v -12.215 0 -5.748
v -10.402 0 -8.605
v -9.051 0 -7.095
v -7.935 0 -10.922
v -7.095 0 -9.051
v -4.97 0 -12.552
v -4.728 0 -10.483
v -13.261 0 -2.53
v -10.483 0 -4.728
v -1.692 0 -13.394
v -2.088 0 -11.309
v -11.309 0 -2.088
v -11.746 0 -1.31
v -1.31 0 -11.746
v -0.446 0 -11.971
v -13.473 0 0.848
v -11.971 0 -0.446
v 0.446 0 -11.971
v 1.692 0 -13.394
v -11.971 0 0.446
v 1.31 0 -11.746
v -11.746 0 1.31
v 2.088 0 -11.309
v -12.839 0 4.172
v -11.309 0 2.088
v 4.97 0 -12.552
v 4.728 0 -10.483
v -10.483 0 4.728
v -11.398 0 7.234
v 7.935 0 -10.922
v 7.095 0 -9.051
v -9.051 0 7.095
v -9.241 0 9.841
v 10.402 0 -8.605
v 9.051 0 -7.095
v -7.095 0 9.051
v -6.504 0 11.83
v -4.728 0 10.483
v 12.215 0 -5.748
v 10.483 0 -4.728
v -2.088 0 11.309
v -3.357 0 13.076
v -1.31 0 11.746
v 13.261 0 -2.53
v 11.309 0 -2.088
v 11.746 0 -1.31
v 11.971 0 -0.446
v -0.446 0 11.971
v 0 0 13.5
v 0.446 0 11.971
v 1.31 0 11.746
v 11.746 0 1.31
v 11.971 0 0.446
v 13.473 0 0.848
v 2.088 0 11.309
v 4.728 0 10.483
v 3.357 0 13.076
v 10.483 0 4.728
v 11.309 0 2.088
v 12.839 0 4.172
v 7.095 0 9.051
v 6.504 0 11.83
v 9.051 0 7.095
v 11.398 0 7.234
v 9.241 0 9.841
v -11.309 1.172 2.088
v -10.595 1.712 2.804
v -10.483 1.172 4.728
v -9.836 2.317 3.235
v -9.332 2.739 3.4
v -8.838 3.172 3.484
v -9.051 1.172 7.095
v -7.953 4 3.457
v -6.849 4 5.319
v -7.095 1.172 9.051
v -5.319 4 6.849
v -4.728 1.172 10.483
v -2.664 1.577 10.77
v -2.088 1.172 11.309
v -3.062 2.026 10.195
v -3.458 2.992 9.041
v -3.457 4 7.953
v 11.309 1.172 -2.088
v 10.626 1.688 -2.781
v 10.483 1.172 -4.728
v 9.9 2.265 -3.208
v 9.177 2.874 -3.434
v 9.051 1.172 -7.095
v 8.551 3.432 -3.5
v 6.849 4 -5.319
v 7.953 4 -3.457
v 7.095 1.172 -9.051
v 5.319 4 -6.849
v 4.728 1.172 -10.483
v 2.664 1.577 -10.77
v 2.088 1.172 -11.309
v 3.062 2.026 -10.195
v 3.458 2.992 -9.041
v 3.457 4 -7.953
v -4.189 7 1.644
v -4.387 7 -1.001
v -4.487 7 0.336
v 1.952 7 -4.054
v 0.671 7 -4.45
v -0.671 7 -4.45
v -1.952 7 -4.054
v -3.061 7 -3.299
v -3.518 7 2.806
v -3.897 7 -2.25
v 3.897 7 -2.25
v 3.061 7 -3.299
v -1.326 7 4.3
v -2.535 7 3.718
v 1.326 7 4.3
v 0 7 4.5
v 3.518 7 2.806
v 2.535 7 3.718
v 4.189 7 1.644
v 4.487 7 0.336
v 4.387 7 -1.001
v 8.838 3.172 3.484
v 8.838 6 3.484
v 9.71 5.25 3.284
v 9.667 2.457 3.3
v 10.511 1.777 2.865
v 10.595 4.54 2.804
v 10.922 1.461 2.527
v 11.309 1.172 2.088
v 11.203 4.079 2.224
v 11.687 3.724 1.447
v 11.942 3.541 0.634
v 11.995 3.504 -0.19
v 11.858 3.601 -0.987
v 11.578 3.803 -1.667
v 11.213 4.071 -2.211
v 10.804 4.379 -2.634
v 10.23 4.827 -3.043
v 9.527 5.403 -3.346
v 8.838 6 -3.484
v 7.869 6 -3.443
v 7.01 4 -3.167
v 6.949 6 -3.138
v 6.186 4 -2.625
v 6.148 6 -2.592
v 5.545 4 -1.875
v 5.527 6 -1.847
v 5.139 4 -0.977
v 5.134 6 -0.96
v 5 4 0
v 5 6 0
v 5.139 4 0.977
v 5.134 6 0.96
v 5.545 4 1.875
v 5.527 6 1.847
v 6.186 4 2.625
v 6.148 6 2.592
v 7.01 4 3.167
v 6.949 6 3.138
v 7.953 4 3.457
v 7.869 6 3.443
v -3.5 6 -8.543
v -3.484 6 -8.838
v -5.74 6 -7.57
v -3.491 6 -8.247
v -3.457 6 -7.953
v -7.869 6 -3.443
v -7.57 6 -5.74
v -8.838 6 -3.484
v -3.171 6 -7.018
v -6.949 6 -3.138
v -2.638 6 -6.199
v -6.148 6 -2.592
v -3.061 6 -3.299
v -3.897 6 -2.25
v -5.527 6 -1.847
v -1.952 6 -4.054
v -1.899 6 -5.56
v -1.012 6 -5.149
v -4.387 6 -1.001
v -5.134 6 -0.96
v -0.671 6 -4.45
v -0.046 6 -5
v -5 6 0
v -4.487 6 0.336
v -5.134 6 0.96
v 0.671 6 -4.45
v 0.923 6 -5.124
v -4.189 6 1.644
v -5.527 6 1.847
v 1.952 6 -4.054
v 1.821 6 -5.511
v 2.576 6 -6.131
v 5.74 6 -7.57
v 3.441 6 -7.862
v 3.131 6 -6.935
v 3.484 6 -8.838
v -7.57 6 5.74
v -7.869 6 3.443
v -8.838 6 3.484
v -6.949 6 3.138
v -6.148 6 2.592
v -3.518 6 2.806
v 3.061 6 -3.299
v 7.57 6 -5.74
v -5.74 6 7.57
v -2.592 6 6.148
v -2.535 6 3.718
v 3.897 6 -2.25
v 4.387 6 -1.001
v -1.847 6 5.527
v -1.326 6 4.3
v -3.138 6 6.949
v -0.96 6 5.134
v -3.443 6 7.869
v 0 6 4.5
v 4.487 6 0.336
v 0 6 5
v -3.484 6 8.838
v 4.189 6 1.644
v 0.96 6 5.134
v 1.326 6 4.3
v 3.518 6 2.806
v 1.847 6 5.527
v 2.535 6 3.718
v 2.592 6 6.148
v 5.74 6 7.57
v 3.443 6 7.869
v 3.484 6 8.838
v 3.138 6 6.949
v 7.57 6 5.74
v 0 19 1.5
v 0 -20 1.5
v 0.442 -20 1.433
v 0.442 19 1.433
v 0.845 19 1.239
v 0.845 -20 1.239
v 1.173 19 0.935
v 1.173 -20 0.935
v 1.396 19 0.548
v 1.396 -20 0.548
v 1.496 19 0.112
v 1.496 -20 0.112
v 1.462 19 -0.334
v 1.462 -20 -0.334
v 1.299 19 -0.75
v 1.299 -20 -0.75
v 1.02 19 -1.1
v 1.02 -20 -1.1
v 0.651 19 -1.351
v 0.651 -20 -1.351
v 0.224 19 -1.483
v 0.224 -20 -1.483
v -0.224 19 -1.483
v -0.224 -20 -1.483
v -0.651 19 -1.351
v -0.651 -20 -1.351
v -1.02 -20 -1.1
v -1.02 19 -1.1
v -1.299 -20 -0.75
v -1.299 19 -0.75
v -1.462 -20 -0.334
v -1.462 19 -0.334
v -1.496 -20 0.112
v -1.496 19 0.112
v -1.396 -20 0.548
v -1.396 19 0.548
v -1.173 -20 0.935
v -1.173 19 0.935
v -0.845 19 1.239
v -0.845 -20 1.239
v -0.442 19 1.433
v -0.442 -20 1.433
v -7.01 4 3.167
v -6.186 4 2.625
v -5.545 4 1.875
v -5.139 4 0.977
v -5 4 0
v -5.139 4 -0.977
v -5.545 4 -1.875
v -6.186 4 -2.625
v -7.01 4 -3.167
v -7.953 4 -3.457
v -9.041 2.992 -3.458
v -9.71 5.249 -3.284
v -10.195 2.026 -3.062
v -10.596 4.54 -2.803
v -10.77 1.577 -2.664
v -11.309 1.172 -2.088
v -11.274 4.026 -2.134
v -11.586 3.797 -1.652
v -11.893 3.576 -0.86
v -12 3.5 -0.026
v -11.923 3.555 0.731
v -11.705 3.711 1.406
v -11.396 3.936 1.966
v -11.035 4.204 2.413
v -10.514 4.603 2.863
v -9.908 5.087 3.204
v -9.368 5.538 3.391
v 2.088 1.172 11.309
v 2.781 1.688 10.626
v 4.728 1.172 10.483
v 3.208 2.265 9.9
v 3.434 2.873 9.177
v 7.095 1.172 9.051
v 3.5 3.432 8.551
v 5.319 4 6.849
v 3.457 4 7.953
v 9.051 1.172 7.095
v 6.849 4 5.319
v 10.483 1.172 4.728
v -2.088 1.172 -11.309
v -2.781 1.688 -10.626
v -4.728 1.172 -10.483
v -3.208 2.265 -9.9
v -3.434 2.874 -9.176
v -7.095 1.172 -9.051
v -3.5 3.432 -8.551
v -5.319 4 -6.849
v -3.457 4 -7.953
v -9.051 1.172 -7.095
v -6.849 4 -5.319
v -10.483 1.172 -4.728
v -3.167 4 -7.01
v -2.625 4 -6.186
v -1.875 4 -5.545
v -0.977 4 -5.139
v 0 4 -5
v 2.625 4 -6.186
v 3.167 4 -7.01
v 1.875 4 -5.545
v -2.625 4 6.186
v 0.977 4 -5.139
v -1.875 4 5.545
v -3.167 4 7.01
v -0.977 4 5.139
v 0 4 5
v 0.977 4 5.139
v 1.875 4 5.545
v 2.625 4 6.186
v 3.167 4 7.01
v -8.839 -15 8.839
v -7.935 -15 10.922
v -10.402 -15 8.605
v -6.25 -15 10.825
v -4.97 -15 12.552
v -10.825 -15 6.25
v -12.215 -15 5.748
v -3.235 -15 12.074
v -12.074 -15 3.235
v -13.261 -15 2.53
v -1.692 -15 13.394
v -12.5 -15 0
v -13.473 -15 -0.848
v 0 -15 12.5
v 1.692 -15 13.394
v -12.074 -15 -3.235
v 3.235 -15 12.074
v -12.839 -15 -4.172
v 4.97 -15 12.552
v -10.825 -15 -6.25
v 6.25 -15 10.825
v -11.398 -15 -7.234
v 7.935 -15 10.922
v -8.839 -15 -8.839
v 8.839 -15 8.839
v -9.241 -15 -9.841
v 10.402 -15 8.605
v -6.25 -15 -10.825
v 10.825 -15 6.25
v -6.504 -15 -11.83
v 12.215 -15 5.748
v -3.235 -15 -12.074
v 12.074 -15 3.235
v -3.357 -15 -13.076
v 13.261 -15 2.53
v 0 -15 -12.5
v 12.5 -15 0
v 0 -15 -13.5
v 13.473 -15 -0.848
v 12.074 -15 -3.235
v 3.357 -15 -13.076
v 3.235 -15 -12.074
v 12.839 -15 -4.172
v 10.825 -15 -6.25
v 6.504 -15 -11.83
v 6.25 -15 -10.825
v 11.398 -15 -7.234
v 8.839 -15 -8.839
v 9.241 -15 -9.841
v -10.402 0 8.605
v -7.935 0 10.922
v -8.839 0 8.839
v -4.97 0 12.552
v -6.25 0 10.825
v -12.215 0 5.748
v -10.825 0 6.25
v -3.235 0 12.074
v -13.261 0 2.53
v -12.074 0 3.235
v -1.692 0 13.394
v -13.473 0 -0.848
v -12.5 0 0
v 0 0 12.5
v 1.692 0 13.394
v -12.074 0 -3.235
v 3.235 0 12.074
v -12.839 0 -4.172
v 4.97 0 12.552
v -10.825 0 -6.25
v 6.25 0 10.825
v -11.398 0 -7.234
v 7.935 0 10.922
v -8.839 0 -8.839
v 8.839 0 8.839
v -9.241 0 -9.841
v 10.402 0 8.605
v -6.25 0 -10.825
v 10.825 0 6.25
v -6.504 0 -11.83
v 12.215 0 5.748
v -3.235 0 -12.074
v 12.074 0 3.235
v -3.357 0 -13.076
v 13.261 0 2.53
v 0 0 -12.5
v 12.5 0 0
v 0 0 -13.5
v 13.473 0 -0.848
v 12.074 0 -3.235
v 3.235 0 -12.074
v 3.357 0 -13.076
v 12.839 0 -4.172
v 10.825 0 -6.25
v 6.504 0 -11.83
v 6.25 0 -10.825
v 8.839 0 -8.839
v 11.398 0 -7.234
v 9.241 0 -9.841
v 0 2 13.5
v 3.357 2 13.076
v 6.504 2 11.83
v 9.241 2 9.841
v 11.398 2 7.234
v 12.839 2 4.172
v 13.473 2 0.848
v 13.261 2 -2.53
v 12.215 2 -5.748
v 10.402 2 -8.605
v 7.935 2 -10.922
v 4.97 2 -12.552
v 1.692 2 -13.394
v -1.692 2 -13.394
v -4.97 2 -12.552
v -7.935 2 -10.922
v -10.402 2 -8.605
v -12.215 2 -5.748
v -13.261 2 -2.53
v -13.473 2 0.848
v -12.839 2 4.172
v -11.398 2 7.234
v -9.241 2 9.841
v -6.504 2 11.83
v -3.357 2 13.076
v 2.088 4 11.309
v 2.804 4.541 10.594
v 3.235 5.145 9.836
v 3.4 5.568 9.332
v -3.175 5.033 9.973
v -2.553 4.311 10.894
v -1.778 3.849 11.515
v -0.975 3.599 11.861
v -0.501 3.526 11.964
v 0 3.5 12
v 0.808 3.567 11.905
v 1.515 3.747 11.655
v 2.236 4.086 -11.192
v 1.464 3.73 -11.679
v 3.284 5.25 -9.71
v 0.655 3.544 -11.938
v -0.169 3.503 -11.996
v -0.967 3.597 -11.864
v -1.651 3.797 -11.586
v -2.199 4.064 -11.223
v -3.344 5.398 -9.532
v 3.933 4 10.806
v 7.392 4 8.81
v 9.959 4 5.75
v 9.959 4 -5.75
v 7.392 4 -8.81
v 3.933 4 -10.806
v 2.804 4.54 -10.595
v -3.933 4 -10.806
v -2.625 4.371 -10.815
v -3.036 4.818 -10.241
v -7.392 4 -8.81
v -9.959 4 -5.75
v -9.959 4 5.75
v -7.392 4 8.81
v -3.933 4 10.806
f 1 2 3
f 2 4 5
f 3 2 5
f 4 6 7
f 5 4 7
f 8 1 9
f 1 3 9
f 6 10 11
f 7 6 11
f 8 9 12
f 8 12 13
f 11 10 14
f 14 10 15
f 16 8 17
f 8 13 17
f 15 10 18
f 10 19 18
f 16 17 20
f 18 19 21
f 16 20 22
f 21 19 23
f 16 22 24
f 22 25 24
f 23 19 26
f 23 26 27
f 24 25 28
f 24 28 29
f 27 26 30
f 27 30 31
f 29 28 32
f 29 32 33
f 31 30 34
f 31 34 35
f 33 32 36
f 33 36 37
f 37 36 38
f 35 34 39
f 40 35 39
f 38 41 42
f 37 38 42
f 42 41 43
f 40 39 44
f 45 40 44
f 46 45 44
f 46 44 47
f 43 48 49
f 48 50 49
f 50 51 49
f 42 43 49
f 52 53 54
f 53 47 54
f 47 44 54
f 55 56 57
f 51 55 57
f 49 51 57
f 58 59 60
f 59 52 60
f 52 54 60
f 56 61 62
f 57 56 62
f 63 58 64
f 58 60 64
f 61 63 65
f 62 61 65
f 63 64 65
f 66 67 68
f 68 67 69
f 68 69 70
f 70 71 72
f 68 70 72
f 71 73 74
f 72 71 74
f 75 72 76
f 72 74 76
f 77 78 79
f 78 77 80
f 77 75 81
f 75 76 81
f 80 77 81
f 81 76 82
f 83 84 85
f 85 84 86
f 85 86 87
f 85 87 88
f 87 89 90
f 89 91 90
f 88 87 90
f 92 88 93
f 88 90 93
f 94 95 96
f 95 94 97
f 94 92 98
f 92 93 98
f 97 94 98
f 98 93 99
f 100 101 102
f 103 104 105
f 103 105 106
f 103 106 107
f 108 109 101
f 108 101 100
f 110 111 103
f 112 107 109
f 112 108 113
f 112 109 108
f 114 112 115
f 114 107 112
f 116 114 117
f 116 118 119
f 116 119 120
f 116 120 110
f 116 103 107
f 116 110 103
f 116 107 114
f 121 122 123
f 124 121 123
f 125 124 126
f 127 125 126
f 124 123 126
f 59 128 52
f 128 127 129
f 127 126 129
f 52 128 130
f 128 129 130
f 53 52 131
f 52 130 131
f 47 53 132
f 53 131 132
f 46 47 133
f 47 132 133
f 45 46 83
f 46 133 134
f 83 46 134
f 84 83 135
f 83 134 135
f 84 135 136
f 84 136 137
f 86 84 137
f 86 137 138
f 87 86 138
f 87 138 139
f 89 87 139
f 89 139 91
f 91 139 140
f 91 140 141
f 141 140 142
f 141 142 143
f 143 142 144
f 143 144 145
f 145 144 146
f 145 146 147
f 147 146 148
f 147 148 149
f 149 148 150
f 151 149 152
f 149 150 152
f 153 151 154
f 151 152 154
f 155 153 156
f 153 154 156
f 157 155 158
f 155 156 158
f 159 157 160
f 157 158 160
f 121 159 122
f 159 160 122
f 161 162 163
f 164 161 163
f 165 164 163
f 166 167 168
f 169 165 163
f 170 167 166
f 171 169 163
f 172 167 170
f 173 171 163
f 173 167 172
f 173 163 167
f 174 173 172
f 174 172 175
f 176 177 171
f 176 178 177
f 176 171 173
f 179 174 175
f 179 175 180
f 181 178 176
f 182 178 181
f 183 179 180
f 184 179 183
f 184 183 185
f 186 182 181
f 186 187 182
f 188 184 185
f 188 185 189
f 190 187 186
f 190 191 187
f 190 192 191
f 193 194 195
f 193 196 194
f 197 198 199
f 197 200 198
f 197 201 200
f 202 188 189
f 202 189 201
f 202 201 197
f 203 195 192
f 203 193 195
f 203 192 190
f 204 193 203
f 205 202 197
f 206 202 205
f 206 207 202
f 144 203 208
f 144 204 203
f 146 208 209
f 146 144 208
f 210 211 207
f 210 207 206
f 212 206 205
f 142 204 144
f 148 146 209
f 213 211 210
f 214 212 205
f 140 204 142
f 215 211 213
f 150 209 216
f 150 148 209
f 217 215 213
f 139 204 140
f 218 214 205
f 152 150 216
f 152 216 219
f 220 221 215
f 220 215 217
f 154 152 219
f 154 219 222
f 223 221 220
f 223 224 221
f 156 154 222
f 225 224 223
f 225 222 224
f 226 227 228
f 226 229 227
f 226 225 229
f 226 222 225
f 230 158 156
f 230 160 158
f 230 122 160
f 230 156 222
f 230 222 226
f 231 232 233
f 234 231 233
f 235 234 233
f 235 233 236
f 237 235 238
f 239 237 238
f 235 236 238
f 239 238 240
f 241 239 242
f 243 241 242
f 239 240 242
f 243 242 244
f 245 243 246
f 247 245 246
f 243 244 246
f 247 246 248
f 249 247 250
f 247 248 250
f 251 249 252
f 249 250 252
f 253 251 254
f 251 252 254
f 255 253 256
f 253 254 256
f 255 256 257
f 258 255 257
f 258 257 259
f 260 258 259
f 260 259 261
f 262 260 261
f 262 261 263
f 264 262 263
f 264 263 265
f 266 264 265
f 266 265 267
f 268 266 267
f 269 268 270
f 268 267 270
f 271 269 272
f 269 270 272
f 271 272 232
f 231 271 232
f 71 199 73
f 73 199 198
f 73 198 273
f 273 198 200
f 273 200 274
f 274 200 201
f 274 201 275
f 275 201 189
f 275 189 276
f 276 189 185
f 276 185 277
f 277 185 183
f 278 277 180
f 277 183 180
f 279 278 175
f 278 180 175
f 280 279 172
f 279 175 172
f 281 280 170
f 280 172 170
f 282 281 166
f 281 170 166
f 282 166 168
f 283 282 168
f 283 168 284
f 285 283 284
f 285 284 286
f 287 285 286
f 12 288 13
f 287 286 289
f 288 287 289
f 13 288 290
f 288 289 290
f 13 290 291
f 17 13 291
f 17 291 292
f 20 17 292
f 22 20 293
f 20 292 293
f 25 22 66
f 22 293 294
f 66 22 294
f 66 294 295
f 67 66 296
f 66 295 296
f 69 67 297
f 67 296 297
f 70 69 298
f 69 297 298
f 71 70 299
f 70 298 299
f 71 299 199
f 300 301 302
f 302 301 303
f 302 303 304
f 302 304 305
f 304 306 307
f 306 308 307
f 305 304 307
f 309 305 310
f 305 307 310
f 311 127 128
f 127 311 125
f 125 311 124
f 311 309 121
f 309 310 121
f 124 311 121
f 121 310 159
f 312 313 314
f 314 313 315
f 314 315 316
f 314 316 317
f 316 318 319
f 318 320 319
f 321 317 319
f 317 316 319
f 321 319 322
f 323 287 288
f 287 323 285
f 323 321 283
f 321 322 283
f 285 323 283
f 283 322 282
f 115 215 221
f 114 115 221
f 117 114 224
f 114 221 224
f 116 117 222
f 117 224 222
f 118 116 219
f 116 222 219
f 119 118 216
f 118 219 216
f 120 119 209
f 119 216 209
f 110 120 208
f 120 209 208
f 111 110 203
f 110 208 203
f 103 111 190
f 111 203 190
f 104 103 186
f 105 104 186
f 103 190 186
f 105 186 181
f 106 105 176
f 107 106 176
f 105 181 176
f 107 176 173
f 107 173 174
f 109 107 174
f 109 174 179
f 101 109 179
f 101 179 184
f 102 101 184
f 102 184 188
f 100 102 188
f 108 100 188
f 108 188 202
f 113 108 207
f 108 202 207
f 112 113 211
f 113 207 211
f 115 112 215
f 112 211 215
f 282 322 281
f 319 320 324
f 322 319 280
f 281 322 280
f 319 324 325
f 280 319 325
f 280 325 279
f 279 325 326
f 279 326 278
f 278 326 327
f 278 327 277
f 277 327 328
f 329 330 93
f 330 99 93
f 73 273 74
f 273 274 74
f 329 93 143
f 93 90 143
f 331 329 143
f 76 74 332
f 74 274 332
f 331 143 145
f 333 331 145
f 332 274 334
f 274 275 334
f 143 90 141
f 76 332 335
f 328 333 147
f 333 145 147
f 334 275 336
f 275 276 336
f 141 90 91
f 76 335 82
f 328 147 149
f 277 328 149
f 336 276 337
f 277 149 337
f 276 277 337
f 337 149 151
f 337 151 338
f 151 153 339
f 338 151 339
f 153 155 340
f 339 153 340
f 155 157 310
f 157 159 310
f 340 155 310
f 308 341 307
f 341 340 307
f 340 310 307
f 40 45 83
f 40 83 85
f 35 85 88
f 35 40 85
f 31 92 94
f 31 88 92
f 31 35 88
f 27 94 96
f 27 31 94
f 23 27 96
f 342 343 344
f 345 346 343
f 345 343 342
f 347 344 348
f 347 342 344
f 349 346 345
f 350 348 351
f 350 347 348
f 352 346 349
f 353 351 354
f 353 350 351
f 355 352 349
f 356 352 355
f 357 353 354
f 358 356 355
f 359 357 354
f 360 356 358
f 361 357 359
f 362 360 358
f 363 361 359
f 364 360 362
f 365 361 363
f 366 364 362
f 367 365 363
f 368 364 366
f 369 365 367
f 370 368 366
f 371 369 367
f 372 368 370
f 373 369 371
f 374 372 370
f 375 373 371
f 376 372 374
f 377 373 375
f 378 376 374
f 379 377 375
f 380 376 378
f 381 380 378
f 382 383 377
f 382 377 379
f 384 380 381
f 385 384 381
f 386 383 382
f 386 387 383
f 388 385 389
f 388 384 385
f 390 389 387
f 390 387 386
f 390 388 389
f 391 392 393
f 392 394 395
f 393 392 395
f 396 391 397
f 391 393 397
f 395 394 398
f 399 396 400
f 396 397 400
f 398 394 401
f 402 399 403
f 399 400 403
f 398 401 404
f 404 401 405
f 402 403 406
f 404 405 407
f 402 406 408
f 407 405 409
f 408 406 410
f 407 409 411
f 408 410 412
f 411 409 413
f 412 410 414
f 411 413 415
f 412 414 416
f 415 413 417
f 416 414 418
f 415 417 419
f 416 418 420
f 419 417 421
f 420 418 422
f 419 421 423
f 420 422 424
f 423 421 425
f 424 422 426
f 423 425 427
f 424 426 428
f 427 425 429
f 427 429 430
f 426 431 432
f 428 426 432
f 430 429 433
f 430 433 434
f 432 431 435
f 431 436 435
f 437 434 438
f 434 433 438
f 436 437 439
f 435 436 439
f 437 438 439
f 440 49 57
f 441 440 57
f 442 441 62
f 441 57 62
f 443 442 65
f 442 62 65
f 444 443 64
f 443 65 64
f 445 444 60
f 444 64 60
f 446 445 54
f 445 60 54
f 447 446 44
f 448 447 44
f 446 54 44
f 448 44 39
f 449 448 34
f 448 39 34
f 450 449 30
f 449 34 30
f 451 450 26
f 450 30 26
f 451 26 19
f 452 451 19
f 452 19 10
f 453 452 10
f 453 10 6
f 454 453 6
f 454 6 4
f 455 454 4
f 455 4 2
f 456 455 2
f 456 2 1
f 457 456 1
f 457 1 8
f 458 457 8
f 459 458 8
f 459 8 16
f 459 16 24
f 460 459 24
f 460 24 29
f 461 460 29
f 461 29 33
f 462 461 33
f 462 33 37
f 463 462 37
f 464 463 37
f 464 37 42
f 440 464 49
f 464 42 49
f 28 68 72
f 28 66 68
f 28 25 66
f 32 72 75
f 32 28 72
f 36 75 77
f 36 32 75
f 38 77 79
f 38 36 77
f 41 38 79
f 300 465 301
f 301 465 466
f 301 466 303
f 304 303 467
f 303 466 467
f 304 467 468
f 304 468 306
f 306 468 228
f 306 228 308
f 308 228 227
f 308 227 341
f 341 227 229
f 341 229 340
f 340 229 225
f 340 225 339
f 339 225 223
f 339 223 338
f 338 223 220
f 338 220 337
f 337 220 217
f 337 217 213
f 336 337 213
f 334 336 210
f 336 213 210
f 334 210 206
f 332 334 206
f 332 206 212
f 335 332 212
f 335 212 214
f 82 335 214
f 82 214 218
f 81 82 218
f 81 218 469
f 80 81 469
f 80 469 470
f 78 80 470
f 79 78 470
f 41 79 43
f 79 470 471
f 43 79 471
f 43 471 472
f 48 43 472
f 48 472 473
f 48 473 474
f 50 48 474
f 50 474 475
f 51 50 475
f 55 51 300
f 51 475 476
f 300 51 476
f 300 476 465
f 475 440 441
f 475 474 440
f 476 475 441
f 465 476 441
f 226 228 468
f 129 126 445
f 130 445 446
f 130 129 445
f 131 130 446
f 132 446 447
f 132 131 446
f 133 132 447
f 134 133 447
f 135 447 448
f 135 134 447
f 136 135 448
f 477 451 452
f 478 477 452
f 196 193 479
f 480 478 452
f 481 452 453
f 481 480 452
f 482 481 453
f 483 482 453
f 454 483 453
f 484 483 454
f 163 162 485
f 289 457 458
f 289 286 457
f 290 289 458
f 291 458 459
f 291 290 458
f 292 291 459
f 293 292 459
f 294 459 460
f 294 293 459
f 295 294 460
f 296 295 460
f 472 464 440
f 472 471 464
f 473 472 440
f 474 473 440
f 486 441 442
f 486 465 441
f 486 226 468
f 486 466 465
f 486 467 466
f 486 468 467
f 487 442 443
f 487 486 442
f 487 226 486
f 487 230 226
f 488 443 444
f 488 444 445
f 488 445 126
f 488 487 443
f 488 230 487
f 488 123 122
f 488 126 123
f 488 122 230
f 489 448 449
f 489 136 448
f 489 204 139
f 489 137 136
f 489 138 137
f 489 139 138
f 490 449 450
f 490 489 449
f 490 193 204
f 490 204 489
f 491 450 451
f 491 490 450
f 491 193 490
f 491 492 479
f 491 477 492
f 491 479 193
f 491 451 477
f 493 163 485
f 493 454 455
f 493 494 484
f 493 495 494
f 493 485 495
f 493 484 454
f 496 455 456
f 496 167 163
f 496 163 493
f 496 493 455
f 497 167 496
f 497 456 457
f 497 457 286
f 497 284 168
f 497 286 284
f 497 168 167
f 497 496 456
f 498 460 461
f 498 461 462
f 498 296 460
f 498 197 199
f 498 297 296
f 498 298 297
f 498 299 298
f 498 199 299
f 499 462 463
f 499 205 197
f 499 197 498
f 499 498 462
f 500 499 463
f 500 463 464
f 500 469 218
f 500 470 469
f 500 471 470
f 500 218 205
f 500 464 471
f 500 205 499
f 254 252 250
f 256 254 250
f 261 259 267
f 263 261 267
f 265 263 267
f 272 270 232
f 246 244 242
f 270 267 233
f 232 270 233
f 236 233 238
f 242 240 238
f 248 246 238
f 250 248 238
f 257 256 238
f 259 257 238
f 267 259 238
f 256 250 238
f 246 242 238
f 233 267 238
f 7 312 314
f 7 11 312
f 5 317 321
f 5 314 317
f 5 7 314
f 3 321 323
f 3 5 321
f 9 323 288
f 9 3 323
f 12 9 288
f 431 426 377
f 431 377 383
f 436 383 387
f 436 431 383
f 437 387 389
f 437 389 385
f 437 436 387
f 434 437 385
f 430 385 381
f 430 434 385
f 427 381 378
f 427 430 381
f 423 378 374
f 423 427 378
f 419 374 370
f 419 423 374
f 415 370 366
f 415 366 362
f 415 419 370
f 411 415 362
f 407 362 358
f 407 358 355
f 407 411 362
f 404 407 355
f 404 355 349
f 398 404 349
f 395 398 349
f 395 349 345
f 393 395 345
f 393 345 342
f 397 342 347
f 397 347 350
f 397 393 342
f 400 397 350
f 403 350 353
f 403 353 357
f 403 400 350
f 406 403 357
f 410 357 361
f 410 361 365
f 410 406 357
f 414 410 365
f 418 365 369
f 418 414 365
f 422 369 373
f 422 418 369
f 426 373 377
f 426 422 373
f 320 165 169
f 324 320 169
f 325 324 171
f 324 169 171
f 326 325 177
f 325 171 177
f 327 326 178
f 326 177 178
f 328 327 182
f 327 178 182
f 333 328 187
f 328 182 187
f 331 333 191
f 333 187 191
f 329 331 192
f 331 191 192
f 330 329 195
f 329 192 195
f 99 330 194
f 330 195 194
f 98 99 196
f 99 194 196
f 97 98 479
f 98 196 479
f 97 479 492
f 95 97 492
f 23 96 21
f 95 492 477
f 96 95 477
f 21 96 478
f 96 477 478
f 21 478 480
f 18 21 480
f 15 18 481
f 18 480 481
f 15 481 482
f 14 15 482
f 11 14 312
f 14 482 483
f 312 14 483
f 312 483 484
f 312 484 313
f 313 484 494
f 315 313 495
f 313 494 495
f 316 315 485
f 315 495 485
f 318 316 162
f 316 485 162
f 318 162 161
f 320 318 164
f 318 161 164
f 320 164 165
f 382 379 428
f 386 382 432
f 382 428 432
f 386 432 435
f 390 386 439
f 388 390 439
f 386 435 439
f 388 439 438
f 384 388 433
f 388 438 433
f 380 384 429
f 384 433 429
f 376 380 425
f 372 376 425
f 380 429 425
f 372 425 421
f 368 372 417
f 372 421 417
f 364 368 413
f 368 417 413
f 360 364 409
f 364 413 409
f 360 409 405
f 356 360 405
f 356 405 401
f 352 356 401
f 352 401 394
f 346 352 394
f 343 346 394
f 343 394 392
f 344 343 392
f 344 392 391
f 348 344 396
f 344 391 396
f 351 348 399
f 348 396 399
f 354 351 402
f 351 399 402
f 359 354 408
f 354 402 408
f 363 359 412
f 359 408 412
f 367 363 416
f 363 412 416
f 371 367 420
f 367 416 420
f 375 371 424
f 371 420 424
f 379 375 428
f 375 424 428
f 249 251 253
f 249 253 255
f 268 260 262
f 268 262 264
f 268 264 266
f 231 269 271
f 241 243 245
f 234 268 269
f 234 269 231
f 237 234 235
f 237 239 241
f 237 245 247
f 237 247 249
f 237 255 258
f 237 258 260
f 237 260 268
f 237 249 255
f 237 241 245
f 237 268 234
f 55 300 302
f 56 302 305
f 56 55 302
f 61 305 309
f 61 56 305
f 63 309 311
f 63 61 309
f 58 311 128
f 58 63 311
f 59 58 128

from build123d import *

# Parameters (mm, degrees)
IZIM2_R                          = 13.5
Y_KSEKLIK_EKSTR_ZYON1_DEPTH      = 1
IZIM3_R                          = 13.5
Y_KSEKLIK_EKSTR_ZYON2_DEPTH      = 5
PAH1_SIZE                        = 4
BO_ALTMA1_T                      = -2
IZIM5_R                          = 3.5
KES_EKSTR_ZYON1_DEPTH            = 6
IZIM7_R                          = 4.5
Y_KSEKLIK_EKSTR_ZYON4_DEPTH      = 1
IZIM6_R                          = 13.5
IZIM6_R_2                        = 12.5
Y_KSEKLIK_EKSTR_ZYON6_DEPTH      = 15
Y_KSEKLIK_EKSTR_ZYON7_DEPTH      = 12
Y_KSEKLIK_EKSTR_ZYON7_DEPTH_BACK = 27
IZIM8_R                          = 1.5


with BuildPart() as part:
    # Çizim2 → Yükseklik-Ekstrüzyon1 (new body)
    with BuildSketch(Plane(origin=(0, 0, 0), x_dir=(1, 0, 0), z_dir=(0, 1, 0))):
        with Locations(Location((0, 0, 0), (0, 0, 270))):
            Circle(IZIM2_R)
    extrude(amount=Y_KSEKLIK_EKSTR_ZYON1_DEPTH)

    # Çizim3 → Yükseklik-Ekstrüzyon2 (add)
    with BuildSketch(Plane(origin=(0, 1, 0), x_dir=(1, 0, 0), z_dir=(0, 1, 0))):
        with Locations(Location((0, 0, 0), (0, 0, 270))):
            Circle(IZIM3_R)
    extrude(amount=Y_KSEKLIK_EKSTR_ZYON2_DEPTH)

    # Pah1
    pah1_edges = [part.edges().sort_by_distance(p)[0] for p in [
        (0, 6, -13.5),
    ]]
    chamfer(pah1_edges, length=PAH1_SIZE)

    # İç Boşaltma1
    bo_altma1_openings = [part.faces().sort_by_distance(p)[0] for p in [
        (0, 0, 0),
    ]]
    offset(amount=BO_ALTMA1_T, openings=bo_altma1_openings, kind=Kind.INTERSECTION)

    # Çizim5 → Kes-Ekstrüzyon1 (cut)
    with BuildSketch(Plane(origin=(0, 6, 0), x_dir=(1, 0, 0), z_dir=(0, 1, 0))):
        with Locations(Location((0, -8.5, 0), (0, 0, 306.628480217))):
            Circle(IZIM5_R)
        with Locations(Location((-8.5, 0, 0), (0, 0, 264.454358135))):
            Circle(IZIM5_R)
        with Locations(Location((0, 8.5, 0), (0, 0, 188.996074249))):
            Circle(IZIM5_R)
        with Locations(Location((8.5, 0, 0), (0, 0, 275.545641715))):
            Circle(IZIM5_R)
    extrude(amount=-KES_EKSTR_ZYON1_DEPTH, mode=Mode.SUBTRACT)

    # Çizim7 → Yükseklik-Ekstrüzyon4 (add)
    with BuildSketch(Plane(origin=(0, 6, 0), x_dir=(1, 0, 0), z_dir=(0, 1, 0))):
        with Locations(Location((0, 0, 0), (0, 0, 270))):
            Circle(IZIM7_R)
    extrude(amount=Y_KSEKLIK_EKSTR_ZYON4_DEPTH)


with BuildPart() as body_2:
    # Çizim6 → Yükseklik-Ekstrüzyon6 (new body)
    with BuildSketch(Plane.XZ):
        with Locations(Location((0, 0, 0), (0, 0, 270))):
            Circle(IZIM6_R)
        with Locations(Location((0, 0, 0), (0, 0, 270))):
            Circle(IZIM6_R_2, mode=Mode.SUBTRACT)
    extrude(amount=Y_KSEKLIK_EKSTR_ZYON6_DEPTH)


with BuildPart() as body_3:
    # Çizim8 → Yükseklik-Ekstrüzyon7 (new, two sides: drawn at the far end of the back side and taken through both)
    with BuildSketch(Plane(origin=(0, 7, 0), x_dir=(1, 0, 0), z_dir=(0, 1, 0)).offset(-Y_KSEKLIK_EKSTR_ZYON7_DEPTH_BACK)):
        with Locations(Location((0, 0, 0), (0, 0, 270))):
            Circle(IZIM8_R)
    extrude(amount=Y_KSEKLIK_EKSTR_ZYON7_DEPTH + Y_KSEKLIK_EKSTR_ZYON7_DEPTH_BACK)


solid = Compound([part.part, body_2.part, body_3.part])
